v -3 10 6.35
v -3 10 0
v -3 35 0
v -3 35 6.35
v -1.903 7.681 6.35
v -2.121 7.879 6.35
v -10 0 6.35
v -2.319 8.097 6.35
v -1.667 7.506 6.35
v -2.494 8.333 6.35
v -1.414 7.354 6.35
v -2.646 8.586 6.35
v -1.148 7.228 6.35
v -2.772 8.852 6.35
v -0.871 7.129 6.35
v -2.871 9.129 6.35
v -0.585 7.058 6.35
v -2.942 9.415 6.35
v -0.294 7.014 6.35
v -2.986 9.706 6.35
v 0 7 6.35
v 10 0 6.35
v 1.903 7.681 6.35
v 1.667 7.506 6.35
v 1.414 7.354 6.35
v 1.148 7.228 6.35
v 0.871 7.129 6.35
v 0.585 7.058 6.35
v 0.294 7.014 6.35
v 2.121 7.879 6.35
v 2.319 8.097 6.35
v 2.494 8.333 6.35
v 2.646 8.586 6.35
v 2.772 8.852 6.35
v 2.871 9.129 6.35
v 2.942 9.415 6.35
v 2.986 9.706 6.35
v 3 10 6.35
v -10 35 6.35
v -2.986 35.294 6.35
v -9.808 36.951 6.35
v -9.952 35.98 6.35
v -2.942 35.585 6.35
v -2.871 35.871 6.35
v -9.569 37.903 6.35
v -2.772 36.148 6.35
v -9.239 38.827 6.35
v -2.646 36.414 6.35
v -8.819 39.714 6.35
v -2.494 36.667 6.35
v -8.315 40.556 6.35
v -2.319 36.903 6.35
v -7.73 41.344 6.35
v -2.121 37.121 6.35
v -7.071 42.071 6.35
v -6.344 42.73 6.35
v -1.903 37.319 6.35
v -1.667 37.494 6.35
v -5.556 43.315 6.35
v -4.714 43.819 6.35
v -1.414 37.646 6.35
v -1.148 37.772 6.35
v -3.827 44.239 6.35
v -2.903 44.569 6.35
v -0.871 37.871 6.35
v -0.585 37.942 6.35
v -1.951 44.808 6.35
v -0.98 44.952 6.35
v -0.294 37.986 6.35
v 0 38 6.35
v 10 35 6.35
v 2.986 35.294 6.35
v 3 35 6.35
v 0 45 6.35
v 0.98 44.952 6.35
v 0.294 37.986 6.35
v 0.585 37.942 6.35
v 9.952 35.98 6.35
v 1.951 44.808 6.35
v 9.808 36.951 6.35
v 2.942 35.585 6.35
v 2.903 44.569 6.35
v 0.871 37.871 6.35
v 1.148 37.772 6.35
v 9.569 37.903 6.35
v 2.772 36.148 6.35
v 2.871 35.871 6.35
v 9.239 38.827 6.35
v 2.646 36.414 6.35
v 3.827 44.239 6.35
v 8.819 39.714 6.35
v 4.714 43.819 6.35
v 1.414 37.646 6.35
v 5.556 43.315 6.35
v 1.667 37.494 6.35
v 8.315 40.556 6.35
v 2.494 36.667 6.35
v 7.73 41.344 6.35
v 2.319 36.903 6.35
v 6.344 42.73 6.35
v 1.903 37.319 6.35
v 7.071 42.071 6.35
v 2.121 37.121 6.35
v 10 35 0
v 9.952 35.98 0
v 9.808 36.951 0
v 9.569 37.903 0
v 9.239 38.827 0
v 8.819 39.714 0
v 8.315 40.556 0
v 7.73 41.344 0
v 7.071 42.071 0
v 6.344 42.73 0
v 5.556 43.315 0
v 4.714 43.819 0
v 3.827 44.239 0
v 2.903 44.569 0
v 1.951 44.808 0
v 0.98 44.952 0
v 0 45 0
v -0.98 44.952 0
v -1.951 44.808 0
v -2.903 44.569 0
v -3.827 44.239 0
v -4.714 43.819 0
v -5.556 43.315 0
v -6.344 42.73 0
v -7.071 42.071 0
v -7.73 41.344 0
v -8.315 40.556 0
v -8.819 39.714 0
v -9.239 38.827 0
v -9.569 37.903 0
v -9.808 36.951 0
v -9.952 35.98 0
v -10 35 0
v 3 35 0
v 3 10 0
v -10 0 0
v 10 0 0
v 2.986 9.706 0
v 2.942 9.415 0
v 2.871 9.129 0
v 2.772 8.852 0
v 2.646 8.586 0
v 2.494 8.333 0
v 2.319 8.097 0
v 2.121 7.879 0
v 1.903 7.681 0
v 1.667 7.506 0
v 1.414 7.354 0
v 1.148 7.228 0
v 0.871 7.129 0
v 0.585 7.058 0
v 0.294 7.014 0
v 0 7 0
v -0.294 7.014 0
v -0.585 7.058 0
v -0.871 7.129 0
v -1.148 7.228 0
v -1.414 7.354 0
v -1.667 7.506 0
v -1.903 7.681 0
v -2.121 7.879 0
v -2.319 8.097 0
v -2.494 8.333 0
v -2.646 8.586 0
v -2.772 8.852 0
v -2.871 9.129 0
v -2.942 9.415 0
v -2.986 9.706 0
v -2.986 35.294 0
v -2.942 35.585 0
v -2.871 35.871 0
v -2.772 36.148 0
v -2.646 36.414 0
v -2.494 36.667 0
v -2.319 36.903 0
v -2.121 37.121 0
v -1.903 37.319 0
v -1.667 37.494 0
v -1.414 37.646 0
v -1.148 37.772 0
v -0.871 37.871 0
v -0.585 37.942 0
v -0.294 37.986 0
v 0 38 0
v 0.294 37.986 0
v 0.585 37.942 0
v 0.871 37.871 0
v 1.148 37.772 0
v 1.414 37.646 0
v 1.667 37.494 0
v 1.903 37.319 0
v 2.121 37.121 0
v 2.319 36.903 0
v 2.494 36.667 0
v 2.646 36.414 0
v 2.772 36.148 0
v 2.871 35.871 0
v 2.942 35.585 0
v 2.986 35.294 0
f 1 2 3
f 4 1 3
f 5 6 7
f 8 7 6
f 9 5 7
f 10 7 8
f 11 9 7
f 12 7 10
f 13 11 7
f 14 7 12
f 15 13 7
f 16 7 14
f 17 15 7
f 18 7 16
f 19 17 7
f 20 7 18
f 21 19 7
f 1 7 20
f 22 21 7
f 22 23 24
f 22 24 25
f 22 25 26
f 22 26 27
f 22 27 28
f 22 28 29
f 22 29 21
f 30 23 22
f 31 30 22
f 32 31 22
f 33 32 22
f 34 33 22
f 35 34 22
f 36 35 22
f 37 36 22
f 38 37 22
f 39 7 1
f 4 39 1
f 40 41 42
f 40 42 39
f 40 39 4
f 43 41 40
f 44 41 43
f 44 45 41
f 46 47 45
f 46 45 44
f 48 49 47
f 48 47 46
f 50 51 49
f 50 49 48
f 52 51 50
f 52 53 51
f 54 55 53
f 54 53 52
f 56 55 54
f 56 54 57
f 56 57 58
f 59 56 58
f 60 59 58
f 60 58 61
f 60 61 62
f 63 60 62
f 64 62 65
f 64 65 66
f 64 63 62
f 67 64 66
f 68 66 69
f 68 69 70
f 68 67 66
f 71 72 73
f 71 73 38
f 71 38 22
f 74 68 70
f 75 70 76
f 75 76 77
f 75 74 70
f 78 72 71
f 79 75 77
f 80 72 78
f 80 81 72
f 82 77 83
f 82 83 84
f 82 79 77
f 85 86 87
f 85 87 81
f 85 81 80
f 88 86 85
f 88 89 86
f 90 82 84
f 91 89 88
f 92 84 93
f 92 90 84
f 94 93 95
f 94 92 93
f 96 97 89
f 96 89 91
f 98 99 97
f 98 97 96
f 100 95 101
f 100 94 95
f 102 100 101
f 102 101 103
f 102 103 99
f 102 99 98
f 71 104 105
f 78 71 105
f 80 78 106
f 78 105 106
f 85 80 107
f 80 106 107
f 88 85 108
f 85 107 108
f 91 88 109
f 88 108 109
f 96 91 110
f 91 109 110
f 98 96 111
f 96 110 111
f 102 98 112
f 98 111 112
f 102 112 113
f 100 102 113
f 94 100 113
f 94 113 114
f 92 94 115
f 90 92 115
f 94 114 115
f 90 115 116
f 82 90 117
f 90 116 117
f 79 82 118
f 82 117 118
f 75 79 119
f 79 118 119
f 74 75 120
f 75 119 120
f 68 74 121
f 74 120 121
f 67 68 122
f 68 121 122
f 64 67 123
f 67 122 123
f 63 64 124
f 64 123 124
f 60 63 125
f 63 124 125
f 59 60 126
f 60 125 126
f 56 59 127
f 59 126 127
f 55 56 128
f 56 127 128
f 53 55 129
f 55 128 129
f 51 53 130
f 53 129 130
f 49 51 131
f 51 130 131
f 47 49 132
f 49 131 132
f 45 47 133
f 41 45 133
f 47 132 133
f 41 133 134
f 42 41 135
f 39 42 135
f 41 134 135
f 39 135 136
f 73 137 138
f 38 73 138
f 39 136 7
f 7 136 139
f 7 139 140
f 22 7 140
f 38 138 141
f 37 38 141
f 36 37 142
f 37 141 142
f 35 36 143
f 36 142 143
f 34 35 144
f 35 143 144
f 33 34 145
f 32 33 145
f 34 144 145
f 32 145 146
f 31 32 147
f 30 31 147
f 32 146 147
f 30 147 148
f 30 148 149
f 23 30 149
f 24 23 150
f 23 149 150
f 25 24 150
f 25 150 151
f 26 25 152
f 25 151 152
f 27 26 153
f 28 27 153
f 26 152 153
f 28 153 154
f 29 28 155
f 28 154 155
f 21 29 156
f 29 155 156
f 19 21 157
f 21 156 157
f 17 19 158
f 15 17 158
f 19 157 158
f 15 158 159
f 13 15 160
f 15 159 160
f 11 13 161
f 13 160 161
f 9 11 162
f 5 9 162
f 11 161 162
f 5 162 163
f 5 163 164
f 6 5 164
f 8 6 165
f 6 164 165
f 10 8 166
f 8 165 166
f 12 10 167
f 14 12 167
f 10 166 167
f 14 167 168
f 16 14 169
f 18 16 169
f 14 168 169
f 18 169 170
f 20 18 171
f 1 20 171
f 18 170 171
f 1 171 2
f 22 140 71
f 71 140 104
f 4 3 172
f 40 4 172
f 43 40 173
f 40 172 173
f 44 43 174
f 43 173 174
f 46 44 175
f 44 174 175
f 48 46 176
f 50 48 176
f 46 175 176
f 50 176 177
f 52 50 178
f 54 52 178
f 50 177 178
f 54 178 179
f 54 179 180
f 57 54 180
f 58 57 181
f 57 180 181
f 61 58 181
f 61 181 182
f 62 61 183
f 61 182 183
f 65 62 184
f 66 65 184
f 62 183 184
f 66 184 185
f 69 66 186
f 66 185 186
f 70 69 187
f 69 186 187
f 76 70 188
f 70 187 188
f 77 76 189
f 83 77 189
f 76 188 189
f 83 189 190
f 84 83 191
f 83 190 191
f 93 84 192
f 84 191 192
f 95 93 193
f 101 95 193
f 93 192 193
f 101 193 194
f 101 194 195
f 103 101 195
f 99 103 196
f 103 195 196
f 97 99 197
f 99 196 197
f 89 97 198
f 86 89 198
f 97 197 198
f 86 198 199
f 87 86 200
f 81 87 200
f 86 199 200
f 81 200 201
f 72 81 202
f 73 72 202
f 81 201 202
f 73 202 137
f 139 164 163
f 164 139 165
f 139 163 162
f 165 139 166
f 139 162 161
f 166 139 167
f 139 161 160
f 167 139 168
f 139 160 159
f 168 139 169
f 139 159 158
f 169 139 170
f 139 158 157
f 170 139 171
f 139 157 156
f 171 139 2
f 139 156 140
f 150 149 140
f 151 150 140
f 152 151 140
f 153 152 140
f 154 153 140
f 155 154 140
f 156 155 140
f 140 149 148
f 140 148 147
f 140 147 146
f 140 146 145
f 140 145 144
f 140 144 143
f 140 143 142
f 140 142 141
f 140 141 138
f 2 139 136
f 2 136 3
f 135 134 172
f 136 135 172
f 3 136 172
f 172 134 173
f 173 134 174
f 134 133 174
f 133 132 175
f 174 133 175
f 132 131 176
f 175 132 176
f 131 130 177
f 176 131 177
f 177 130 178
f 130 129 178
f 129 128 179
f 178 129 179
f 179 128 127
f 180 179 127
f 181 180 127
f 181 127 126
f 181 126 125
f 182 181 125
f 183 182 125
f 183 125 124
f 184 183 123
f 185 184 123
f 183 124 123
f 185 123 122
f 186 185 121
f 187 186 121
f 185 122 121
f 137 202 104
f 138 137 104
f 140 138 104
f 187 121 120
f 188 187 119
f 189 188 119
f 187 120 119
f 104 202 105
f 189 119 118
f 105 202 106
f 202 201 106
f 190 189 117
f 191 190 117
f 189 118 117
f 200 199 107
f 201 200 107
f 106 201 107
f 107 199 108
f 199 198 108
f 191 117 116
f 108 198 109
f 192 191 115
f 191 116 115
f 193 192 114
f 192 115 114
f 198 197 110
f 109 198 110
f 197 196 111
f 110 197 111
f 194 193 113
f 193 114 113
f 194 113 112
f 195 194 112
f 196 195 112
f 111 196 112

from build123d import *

# Parameters (mm, degrees)
BOSS_EXTRUDE1_DEPTH = 6.35


with BuildPart() as part:
    # Sketch1 → Boss-Extrude1 (new body)
    with BuildSketch(Plane.XY):
        with BuildLine():
            Line((-10, 35), (-10, 0))
            Line((-10, 0), (10, 0))
            Line((10, 0), (10, 35))
            ThreePointArc((10, 35), (0, 45), (-10, 35))
        make_face()
        with BuildLine():
            Line((3, 35), (3, 10))
            ThreePointArc((3, 10), (0, 7), (-3, 10))
            Line((-3, 10), (-3, 35))
            ThreePointArc((-3, 35), (0, 38), (3, 35))
        make_face(mode=Mode.SUBTRACT)
    extrude(amount=BOSS_EXTRUDE1_DEPTH)


solid = part.part
